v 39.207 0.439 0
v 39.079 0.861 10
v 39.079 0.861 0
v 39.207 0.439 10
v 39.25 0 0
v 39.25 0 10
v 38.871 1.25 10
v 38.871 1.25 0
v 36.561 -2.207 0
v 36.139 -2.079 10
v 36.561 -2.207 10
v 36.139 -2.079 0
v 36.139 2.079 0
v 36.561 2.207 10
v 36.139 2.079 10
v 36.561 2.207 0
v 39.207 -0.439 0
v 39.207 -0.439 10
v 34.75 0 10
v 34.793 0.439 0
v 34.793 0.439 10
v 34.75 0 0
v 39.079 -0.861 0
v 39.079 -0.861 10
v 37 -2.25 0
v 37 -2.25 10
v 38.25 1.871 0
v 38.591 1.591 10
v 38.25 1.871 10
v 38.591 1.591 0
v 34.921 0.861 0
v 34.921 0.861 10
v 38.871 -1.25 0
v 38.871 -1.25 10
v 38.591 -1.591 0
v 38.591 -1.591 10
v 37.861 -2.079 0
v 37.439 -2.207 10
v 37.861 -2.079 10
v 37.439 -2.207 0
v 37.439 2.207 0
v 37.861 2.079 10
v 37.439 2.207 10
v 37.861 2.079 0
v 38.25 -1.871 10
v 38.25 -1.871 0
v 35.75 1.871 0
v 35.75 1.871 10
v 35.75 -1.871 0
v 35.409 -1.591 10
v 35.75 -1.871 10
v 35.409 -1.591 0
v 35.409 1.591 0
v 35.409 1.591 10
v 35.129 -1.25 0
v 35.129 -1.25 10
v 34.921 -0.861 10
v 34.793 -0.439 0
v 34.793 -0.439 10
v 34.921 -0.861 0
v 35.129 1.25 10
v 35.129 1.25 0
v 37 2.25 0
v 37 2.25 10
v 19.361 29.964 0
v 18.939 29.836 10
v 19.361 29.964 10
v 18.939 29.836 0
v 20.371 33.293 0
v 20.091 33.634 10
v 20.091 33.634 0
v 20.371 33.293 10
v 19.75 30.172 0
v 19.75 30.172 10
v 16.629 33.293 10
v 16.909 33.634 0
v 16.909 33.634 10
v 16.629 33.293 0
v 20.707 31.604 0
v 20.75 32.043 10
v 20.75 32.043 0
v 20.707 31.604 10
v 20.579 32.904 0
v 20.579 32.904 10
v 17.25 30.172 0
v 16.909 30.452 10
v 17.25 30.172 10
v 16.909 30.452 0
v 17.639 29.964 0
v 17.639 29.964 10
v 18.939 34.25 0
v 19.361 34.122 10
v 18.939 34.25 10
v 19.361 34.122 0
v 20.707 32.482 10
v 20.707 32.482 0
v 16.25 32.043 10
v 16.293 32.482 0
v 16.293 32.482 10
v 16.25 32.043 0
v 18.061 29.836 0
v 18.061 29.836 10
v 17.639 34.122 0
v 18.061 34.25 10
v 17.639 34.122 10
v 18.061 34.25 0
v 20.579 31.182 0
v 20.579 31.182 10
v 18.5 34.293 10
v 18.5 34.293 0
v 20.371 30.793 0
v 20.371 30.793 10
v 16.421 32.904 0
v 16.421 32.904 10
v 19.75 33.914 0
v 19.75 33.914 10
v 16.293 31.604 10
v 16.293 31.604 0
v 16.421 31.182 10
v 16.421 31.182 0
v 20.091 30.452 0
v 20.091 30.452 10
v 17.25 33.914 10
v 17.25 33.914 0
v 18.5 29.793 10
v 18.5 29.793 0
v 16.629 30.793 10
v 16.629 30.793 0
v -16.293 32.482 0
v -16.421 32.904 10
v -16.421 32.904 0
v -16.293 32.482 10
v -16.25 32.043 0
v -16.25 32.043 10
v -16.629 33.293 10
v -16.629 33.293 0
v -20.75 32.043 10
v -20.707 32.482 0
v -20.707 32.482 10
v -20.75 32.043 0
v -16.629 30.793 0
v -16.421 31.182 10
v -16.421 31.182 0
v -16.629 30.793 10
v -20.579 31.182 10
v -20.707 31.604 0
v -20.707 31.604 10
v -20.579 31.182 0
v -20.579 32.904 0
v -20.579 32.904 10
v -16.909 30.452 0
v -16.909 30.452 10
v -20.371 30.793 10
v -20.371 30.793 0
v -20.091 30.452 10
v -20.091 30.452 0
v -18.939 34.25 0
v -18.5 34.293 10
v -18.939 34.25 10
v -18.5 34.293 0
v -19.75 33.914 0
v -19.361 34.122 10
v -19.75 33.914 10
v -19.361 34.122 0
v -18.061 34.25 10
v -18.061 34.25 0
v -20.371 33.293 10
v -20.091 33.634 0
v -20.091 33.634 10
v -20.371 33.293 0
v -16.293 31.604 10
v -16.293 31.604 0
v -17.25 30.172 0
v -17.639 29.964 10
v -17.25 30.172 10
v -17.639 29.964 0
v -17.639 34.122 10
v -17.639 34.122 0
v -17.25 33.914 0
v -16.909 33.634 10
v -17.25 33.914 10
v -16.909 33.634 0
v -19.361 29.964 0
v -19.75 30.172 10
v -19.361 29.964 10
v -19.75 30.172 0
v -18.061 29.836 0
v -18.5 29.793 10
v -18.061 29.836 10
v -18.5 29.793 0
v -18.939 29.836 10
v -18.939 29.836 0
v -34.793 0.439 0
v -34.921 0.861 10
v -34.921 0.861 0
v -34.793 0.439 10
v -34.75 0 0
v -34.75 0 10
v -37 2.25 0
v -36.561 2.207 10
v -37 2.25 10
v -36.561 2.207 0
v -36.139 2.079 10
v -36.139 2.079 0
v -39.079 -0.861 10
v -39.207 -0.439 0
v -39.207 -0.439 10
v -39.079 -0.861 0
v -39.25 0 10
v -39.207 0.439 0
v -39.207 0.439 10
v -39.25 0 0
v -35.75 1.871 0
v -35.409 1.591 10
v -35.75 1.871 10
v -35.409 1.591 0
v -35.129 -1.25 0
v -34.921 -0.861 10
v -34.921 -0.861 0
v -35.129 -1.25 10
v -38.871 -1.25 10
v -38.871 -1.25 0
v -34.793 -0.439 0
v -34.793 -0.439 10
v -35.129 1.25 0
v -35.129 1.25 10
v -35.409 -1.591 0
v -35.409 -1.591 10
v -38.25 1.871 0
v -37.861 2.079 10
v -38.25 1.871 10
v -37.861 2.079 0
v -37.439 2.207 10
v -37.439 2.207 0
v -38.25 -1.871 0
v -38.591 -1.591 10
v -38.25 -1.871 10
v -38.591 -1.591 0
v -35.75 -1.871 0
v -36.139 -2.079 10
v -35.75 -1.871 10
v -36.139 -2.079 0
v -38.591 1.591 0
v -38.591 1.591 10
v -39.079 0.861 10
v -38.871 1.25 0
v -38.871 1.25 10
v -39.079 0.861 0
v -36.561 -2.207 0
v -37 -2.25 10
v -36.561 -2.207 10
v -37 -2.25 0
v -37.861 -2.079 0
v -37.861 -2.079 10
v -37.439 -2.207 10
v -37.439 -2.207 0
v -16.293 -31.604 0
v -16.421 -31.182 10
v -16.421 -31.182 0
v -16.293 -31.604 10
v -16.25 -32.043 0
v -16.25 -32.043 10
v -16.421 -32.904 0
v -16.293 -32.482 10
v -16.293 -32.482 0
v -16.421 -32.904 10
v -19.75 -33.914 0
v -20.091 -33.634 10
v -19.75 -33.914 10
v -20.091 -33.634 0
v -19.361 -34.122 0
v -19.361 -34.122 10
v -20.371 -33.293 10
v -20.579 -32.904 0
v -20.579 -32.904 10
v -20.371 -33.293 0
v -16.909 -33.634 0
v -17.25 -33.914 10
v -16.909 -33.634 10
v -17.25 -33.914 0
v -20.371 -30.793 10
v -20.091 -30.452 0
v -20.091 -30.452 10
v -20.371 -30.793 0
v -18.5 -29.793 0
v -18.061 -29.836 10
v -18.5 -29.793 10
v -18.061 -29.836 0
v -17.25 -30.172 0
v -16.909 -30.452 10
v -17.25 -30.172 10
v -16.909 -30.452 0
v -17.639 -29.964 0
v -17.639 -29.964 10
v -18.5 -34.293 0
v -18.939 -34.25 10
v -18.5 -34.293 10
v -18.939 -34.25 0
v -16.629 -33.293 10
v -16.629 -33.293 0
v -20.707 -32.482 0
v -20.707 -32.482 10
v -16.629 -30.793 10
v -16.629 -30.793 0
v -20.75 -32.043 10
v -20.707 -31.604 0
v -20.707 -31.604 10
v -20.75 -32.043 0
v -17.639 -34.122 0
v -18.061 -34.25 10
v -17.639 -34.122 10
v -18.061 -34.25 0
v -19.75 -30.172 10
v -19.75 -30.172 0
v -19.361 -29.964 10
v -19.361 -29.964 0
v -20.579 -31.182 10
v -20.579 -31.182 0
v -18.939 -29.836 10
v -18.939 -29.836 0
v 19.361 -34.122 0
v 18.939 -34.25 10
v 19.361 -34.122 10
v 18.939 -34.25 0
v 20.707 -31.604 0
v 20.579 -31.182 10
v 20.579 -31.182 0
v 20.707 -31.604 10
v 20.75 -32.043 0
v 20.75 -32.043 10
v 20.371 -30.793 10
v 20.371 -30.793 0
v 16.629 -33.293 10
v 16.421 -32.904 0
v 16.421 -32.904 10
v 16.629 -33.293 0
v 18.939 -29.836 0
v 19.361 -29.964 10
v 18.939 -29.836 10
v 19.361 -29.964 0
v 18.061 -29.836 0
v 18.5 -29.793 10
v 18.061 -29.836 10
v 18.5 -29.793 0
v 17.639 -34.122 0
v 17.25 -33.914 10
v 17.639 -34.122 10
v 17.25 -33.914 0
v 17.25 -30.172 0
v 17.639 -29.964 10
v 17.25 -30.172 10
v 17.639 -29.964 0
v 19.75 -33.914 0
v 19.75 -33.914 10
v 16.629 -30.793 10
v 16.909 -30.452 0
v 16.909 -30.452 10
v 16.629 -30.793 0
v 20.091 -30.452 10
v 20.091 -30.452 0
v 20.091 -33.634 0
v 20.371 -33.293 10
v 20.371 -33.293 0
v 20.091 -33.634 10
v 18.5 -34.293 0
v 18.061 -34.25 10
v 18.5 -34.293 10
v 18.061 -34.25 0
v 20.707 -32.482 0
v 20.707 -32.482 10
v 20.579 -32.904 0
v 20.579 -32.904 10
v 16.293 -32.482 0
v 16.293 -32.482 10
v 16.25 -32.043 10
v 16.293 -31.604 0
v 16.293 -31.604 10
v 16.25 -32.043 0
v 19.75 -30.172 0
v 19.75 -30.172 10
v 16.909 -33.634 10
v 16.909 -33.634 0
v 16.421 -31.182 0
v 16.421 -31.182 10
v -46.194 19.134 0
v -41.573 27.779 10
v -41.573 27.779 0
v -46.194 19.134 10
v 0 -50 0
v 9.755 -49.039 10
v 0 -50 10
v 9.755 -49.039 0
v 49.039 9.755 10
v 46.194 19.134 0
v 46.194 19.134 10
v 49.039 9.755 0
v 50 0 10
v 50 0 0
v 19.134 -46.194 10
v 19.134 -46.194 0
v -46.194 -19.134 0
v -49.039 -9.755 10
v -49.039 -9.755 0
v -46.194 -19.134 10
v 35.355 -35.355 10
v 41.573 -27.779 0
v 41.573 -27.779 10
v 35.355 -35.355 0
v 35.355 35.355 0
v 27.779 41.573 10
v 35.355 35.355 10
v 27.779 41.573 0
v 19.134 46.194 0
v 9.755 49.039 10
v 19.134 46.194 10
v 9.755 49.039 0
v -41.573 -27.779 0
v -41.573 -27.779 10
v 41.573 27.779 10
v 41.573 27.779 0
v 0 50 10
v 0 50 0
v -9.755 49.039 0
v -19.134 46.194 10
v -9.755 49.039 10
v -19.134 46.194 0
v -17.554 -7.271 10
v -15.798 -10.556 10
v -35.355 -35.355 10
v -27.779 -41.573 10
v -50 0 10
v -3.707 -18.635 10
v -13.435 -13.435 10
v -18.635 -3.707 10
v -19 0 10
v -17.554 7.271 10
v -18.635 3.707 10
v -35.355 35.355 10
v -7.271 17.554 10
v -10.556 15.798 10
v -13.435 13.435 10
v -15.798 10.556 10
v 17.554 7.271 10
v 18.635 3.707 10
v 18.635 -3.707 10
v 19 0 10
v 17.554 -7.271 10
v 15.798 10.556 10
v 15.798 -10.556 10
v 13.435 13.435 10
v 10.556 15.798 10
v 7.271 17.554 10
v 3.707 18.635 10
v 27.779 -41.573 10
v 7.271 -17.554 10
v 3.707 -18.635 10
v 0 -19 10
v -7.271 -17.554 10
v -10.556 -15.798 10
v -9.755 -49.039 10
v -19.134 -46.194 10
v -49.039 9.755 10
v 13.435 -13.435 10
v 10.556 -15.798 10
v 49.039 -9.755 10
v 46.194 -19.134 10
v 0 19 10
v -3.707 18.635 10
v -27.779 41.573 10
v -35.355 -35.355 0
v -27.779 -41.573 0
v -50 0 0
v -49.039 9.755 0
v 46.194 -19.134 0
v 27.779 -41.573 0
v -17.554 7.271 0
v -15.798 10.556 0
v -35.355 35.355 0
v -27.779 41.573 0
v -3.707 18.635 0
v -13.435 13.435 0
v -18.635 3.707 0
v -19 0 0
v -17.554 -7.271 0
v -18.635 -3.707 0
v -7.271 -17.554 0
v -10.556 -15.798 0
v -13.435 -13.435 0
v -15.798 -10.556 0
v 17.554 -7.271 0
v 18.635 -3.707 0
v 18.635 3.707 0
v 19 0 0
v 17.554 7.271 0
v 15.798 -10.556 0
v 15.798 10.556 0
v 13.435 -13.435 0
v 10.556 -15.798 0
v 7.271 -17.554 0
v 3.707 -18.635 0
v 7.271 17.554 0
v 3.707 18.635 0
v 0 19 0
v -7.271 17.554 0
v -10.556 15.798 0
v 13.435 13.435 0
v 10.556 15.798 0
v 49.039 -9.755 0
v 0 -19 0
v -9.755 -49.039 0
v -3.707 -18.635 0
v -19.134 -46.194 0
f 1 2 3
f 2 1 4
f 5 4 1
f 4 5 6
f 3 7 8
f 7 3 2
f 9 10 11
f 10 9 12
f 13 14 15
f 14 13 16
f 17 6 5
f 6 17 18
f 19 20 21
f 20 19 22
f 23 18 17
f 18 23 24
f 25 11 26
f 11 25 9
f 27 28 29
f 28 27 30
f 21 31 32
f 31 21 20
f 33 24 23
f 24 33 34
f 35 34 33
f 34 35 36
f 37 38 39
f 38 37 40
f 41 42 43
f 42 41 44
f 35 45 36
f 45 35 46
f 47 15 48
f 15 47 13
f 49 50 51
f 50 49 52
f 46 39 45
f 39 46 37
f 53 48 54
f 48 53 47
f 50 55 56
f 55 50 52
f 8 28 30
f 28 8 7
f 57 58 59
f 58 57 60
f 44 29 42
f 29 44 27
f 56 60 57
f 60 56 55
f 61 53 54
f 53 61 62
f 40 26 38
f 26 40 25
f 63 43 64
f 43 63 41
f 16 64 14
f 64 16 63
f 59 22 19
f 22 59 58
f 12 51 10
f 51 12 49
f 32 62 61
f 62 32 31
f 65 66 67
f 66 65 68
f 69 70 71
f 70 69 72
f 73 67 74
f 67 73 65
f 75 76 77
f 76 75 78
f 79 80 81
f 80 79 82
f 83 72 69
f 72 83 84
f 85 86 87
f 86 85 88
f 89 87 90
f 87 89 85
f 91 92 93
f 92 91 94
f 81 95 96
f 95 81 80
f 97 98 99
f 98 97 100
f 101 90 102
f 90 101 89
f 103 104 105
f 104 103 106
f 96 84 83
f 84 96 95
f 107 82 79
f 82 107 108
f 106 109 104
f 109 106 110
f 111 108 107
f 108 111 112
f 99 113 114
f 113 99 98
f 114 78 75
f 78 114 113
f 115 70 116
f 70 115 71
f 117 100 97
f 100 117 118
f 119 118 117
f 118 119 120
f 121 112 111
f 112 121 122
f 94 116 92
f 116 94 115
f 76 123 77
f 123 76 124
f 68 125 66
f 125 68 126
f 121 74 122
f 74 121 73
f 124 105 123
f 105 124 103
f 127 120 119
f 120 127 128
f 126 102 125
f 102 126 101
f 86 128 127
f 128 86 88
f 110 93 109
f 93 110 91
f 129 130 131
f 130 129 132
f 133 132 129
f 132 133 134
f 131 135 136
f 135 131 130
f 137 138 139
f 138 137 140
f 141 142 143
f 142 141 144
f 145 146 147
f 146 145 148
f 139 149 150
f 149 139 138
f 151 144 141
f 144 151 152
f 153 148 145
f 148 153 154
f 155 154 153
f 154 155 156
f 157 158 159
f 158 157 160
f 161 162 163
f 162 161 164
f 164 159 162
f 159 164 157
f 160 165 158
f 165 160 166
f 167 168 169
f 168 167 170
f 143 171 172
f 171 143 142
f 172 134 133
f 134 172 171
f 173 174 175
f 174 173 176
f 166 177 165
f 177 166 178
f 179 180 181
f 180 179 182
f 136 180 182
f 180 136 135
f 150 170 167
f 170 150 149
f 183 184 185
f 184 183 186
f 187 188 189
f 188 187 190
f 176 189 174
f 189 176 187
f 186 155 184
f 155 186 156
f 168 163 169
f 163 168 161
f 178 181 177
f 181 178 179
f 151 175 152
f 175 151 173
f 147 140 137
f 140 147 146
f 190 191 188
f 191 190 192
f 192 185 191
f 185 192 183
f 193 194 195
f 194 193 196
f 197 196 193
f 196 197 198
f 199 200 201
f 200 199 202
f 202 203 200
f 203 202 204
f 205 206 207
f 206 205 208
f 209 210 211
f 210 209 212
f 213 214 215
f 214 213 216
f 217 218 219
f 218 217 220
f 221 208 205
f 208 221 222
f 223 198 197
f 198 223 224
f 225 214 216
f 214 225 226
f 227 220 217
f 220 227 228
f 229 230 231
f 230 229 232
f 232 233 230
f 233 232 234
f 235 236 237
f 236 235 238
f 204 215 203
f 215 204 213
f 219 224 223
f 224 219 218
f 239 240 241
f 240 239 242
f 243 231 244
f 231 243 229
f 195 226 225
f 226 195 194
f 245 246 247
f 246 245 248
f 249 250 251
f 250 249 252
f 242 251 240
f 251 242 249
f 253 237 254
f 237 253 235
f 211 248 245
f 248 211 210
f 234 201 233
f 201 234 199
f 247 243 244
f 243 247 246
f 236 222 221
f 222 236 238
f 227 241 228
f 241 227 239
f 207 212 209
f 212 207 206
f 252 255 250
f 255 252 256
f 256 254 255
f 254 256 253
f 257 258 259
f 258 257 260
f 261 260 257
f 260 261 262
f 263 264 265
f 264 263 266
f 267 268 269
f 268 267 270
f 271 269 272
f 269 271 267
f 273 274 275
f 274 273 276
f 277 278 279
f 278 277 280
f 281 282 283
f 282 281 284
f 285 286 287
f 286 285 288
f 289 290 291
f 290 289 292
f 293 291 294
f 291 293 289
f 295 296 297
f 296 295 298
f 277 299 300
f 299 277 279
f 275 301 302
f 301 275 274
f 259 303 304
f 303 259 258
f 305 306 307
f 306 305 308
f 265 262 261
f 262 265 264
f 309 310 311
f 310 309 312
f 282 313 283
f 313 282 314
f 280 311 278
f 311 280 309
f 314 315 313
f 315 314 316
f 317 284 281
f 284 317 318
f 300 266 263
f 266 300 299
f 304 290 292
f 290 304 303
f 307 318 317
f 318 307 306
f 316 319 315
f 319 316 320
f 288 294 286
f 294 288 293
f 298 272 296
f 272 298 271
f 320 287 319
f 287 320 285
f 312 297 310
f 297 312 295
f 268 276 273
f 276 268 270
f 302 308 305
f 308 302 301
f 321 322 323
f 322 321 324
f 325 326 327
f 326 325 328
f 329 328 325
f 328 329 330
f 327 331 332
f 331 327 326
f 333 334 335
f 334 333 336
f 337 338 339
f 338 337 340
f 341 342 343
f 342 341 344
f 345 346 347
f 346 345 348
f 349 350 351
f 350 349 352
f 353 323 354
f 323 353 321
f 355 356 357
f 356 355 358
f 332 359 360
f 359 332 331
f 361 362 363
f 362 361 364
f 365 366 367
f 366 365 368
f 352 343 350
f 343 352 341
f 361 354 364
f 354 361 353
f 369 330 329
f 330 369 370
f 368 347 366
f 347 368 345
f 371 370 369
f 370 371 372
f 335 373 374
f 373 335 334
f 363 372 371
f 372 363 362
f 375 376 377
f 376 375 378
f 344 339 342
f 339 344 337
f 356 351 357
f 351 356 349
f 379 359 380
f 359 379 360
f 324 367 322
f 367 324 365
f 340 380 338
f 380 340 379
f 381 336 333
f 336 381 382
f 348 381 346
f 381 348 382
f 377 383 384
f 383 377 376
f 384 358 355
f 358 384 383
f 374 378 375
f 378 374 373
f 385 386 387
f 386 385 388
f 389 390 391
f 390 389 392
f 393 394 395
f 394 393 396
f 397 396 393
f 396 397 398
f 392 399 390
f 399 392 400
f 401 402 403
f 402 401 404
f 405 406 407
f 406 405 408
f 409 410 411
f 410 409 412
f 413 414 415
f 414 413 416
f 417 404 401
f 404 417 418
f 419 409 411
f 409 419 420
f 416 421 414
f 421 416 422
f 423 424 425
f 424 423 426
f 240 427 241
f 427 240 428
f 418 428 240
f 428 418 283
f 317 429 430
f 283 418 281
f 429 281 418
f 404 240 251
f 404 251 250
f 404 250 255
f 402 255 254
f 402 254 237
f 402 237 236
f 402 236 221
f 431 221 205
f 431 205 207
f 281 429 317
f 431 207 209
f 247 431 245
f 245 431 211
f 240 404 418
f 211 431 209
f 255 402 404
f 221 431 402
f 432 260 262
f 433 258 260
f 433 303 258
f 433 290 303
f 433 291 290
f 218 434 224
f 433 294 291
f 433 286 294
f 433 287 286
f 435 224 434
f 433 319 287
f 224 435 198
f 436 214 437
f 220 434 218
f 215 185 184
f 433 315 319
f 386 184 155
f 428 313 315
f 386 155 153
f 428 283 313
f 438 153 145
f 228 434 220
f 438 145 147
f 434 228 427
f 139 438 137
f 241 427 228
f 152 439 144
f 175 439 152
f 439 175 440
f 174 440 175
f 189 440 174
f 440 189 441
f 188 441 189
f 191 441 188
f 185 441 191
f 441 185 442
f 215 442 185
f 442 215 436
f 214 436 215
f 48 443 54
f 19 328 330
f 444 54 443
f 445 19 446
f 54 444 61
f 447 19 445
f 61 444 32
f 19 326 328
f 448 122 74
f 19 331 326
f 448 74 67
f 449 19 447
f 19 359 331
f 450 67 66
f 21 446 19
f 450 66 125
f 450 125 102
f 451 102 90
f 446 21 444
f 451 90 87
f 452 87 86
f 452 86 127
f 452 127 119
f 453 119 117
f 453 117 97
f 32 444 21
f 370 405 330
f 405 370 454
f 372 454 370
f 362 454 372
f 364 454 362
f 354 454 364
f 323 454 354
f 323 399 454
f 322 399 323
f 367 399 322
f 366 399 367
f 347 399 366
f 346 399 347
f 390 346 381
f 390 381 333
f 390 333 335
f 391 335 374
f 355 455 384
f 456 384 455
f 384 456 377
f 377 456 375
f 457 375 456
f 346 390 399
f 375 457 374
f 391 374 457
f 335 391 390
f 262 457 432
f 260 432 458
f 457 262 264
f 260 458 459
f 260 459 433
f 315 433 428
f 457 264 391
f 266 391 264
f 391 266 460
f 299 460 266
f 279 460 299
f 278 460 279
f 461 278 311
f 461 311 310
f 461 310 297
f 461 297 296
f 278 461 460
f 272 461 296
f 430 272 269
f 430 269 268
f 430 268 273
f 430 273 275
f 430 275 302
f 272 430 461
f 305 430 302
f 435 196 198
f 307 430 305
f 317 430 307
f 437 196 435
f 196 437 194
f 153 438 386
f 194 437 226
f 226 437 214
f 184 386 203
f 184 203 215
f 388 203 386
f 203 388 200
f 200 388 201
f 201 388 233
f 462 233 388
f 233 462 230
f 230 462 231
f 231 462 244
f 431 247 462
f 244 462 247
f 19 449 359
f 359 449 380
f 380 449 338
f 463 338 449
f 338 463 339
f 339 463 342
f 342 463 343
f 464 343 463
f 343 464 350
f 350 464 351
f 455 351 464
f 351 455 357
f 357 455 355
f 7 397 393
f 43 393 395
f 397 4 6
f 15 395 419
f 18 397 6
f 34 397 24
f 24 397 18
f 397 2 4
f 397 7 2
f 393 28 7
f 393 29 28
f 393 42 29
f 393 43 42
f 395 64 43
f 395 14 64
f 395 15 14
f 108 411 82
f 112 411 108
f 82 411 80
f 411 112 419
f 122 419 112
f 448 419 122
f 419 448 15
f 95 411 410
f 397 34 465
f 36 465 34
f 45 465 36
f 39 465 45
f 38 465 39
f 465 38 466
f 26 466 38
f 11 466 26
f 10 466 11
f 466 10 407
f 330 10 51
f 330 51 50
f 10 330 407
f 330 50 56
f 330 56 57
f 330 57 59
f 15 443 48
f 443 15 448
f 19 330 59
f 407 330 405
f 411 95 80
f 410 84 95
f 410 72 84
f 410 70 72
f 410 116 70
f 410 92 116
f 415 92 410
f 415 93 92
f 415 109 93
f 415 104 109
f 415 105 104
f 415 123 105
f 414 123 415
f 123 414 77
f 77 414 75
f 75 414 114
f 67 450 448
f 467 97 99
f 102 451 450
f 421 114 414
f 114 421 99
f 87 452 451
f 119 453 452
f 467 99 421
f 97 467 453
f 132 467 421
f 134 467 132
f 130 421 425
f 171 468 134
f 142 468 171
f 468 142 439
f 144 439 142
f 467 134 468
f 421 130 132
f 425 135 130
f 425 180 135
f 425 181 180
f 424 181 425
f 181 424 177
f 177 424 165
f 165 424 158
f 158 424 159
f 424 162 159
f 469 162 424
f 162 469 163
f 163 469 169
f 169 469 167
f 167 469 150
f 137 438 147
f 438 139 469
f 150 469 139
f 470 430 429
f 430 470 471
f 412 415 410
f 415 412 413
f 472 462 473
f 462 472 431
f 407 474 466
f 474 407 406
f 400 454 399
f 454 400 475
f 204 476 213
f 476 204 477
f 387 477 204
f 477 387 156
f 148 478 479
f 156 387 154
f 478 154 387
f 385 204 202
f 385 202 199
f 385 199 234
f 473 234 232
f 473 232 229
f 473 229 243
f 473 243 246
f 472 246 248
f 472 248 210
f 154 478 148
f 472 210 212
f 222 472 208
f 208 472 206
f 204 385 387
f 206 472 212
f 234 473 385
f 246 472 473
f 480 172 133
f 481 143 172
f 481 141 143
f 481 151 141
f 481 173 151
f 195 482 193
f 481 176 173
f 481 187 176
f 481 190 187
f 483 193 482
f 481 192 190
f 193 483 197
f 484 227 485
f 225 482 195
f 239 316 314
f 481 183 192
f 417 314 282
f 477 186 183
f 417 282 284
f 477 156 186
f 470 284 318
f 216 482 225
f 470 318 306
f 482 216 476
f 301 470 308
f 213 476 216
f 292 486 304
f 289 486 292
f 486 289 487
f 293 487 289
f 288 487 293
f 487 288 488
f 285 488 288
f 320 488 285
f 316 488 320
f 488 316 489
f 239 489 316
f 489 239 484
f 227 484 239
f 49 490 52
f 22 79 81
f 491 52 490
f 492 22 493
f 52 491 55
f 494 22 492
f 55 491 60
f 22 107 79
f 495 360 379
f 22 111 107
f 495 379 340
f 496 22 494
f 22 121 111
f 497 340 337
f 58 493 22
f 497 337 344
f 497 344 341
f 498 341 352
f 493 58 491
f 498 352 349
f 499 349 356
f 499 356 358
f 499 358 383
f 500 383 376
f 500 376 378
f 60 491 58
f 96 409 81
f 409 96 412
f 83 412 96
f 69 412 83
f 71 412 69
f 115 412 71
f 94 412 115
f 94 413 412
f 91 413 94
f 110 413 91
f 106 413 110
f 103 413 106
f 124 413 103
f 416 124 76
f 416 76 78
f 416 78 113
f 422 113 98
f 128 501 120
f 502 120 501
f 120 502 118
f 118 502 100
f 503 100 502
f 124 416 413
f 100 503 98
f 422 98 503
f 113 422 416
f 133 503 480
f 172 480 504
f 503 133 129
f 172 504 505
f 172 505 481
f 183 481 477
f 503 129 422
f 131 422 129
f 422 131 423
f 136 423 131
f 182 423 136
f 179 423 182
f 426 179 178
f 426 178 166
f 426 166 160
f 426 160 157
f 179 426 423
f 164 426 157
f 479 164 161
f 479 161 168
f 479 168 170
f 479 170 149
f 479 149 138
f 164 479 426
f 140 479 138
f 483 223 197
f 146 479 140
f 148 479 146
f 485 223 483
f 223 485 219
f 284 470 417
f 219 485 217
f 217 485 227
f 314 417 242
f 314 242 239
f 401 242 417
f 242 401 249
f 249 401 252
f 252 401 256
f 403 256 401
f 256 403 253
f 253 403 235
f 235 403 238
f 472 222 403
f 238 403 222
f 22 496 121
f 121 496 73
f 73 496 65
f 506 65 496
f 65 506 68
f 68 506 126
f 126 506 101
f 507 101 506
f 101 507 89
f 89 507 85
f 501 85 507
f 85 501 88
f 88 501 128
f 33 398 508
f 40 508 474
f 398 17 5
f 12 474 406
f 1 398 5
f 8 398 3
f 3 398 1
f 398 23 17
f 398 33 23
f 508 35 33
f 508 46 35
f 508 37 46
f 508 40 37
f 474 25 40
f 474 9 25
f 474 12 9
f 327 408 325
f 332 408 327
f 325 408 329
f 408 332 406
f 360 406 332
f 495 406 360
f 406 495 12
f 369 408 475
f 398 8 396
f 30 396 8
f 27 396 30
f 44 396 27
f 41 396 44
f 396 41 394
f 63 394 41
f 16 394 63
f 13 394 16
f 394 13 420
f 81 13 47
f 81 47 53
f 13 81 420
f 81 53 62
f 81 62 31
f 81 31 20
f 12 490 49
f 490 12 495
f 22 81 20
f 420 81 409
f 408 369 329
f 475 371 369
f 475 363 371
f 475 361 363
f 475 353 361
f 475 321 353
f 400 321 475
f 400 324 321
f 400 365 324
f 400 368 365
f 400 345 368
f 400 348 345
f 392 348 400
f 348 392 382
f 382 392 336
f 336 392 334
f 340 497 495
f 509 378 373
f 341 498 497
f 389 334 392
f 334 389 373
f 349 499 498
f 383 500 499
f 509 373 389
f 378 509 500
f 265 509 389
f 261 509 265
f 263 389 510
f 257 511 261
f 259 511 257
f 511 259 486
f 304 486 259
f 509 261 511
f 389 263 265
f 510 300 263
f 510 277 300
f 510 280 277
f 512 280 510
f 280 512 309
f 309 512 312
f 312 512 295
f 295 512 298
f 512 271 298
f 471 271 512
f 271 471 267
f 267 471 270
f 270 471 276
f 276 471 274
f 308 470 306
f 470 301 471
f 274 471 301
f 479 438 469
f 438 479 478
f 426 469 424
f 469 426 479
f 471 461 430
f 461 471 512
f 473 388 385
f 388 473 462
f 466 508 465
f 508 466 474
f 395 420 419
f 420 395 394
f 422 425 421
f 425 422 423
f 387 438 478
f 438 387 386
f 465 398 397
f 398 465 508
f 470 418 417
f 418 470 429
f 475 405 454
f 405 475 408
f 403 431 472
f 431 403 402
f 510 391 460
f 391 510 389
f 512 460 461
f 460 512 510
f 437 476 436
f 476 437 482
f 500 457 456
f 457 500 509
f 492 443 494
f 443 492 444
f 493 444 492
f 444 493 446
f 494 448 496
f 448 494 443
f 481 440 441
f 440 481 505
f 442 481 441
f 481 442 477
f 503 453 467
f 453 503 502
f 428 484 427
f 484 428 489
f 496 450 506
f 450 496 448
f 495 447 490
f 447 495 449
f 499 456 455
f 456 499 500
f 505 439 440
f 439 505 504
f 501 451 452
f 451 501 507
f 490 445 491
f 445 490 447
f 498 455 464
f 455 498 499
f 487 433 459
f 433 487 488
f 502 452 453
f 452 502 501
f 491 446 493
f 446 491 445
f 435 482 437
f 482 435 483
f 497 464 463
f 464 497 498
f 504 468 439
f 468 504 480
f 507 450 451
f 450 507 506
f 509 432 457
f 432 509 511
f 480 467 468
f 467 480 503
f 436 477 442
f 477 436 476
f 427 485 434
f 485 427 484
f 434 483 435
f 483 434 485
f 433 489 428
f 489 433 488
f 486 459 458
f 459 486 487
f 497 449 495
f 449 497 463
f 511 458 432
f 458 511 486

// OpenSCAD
$fn = 32;

// ----------------------------------------------------------------------
// Flange Ø100 x 10
// 6 holes on a Ø74 bolt circle, bolted joints
// ----------------------------------------------------------------------

// --- parameters (mm) ---
flange_d = 100;  // outside diameter of the flange
thickness = 10;  // flange thickness
holes = 6;       // number of bolt holes
pcd = 74;        // bolt circle diameter
start_deg = 0;   // angle of the first hole, from +X
hole_d = 4.5;    // bolt hole diameter
bore_d = 38;     // central through bore
hub_d = 50;      // hub outside diameter
hub_h = 0;       // hub height above the flange face (0 = no hub)

// --- derived feature positions (mm) ---
height = thickness + hub_h;  // = 10   overall height of the part
pcd_r = pcd / 2;             // = 37   bolt circle radius
hole_step = 360 / holes;     // = 60   angular pitch
feature_centers = [
  [pcd_r * cos(start_deg + 0 * hole_step), pcd_r * sin(start_deg + 0 * hole_step)],
  [pcd_r * cos(start_deg + 1 * hole_step), pcd_r * sin(start_deg + 1 * hole_step)],
  [pcd_r * cos(start_deg + 2 * hole_step), pcd_r * sin(start_deg + 2 * hole_step)],
  [pcd_r * cos(start_deg + 3 * hole_step), pcd_r * sin(start_deg + 3 * hole_step)],
  [pcd_r * cos(start_deg + 4 * hole_step), pcd_r * sin(start_deg + 4 * hole_step)],
  [pcd_r * cos(start_deg + 5 * hole_step), pcd_r * sin(start_deg + 5 * hole_step)]
];   // bolt hole centres on the pitch circle

// flange disc, every hole and the bore cut straight through
difference() {
  union() {
    cylinder(d = flange_d, h = thickness);
  }
  translate([0, 0, -1]) cylinder(d = bore_d, h = height + 2);  // bore, through
  for (centre = feature_centers)
    translate([centre[0], centre[1], -1]) cylinder(d = hole_d, h = thickness + 2);
}
